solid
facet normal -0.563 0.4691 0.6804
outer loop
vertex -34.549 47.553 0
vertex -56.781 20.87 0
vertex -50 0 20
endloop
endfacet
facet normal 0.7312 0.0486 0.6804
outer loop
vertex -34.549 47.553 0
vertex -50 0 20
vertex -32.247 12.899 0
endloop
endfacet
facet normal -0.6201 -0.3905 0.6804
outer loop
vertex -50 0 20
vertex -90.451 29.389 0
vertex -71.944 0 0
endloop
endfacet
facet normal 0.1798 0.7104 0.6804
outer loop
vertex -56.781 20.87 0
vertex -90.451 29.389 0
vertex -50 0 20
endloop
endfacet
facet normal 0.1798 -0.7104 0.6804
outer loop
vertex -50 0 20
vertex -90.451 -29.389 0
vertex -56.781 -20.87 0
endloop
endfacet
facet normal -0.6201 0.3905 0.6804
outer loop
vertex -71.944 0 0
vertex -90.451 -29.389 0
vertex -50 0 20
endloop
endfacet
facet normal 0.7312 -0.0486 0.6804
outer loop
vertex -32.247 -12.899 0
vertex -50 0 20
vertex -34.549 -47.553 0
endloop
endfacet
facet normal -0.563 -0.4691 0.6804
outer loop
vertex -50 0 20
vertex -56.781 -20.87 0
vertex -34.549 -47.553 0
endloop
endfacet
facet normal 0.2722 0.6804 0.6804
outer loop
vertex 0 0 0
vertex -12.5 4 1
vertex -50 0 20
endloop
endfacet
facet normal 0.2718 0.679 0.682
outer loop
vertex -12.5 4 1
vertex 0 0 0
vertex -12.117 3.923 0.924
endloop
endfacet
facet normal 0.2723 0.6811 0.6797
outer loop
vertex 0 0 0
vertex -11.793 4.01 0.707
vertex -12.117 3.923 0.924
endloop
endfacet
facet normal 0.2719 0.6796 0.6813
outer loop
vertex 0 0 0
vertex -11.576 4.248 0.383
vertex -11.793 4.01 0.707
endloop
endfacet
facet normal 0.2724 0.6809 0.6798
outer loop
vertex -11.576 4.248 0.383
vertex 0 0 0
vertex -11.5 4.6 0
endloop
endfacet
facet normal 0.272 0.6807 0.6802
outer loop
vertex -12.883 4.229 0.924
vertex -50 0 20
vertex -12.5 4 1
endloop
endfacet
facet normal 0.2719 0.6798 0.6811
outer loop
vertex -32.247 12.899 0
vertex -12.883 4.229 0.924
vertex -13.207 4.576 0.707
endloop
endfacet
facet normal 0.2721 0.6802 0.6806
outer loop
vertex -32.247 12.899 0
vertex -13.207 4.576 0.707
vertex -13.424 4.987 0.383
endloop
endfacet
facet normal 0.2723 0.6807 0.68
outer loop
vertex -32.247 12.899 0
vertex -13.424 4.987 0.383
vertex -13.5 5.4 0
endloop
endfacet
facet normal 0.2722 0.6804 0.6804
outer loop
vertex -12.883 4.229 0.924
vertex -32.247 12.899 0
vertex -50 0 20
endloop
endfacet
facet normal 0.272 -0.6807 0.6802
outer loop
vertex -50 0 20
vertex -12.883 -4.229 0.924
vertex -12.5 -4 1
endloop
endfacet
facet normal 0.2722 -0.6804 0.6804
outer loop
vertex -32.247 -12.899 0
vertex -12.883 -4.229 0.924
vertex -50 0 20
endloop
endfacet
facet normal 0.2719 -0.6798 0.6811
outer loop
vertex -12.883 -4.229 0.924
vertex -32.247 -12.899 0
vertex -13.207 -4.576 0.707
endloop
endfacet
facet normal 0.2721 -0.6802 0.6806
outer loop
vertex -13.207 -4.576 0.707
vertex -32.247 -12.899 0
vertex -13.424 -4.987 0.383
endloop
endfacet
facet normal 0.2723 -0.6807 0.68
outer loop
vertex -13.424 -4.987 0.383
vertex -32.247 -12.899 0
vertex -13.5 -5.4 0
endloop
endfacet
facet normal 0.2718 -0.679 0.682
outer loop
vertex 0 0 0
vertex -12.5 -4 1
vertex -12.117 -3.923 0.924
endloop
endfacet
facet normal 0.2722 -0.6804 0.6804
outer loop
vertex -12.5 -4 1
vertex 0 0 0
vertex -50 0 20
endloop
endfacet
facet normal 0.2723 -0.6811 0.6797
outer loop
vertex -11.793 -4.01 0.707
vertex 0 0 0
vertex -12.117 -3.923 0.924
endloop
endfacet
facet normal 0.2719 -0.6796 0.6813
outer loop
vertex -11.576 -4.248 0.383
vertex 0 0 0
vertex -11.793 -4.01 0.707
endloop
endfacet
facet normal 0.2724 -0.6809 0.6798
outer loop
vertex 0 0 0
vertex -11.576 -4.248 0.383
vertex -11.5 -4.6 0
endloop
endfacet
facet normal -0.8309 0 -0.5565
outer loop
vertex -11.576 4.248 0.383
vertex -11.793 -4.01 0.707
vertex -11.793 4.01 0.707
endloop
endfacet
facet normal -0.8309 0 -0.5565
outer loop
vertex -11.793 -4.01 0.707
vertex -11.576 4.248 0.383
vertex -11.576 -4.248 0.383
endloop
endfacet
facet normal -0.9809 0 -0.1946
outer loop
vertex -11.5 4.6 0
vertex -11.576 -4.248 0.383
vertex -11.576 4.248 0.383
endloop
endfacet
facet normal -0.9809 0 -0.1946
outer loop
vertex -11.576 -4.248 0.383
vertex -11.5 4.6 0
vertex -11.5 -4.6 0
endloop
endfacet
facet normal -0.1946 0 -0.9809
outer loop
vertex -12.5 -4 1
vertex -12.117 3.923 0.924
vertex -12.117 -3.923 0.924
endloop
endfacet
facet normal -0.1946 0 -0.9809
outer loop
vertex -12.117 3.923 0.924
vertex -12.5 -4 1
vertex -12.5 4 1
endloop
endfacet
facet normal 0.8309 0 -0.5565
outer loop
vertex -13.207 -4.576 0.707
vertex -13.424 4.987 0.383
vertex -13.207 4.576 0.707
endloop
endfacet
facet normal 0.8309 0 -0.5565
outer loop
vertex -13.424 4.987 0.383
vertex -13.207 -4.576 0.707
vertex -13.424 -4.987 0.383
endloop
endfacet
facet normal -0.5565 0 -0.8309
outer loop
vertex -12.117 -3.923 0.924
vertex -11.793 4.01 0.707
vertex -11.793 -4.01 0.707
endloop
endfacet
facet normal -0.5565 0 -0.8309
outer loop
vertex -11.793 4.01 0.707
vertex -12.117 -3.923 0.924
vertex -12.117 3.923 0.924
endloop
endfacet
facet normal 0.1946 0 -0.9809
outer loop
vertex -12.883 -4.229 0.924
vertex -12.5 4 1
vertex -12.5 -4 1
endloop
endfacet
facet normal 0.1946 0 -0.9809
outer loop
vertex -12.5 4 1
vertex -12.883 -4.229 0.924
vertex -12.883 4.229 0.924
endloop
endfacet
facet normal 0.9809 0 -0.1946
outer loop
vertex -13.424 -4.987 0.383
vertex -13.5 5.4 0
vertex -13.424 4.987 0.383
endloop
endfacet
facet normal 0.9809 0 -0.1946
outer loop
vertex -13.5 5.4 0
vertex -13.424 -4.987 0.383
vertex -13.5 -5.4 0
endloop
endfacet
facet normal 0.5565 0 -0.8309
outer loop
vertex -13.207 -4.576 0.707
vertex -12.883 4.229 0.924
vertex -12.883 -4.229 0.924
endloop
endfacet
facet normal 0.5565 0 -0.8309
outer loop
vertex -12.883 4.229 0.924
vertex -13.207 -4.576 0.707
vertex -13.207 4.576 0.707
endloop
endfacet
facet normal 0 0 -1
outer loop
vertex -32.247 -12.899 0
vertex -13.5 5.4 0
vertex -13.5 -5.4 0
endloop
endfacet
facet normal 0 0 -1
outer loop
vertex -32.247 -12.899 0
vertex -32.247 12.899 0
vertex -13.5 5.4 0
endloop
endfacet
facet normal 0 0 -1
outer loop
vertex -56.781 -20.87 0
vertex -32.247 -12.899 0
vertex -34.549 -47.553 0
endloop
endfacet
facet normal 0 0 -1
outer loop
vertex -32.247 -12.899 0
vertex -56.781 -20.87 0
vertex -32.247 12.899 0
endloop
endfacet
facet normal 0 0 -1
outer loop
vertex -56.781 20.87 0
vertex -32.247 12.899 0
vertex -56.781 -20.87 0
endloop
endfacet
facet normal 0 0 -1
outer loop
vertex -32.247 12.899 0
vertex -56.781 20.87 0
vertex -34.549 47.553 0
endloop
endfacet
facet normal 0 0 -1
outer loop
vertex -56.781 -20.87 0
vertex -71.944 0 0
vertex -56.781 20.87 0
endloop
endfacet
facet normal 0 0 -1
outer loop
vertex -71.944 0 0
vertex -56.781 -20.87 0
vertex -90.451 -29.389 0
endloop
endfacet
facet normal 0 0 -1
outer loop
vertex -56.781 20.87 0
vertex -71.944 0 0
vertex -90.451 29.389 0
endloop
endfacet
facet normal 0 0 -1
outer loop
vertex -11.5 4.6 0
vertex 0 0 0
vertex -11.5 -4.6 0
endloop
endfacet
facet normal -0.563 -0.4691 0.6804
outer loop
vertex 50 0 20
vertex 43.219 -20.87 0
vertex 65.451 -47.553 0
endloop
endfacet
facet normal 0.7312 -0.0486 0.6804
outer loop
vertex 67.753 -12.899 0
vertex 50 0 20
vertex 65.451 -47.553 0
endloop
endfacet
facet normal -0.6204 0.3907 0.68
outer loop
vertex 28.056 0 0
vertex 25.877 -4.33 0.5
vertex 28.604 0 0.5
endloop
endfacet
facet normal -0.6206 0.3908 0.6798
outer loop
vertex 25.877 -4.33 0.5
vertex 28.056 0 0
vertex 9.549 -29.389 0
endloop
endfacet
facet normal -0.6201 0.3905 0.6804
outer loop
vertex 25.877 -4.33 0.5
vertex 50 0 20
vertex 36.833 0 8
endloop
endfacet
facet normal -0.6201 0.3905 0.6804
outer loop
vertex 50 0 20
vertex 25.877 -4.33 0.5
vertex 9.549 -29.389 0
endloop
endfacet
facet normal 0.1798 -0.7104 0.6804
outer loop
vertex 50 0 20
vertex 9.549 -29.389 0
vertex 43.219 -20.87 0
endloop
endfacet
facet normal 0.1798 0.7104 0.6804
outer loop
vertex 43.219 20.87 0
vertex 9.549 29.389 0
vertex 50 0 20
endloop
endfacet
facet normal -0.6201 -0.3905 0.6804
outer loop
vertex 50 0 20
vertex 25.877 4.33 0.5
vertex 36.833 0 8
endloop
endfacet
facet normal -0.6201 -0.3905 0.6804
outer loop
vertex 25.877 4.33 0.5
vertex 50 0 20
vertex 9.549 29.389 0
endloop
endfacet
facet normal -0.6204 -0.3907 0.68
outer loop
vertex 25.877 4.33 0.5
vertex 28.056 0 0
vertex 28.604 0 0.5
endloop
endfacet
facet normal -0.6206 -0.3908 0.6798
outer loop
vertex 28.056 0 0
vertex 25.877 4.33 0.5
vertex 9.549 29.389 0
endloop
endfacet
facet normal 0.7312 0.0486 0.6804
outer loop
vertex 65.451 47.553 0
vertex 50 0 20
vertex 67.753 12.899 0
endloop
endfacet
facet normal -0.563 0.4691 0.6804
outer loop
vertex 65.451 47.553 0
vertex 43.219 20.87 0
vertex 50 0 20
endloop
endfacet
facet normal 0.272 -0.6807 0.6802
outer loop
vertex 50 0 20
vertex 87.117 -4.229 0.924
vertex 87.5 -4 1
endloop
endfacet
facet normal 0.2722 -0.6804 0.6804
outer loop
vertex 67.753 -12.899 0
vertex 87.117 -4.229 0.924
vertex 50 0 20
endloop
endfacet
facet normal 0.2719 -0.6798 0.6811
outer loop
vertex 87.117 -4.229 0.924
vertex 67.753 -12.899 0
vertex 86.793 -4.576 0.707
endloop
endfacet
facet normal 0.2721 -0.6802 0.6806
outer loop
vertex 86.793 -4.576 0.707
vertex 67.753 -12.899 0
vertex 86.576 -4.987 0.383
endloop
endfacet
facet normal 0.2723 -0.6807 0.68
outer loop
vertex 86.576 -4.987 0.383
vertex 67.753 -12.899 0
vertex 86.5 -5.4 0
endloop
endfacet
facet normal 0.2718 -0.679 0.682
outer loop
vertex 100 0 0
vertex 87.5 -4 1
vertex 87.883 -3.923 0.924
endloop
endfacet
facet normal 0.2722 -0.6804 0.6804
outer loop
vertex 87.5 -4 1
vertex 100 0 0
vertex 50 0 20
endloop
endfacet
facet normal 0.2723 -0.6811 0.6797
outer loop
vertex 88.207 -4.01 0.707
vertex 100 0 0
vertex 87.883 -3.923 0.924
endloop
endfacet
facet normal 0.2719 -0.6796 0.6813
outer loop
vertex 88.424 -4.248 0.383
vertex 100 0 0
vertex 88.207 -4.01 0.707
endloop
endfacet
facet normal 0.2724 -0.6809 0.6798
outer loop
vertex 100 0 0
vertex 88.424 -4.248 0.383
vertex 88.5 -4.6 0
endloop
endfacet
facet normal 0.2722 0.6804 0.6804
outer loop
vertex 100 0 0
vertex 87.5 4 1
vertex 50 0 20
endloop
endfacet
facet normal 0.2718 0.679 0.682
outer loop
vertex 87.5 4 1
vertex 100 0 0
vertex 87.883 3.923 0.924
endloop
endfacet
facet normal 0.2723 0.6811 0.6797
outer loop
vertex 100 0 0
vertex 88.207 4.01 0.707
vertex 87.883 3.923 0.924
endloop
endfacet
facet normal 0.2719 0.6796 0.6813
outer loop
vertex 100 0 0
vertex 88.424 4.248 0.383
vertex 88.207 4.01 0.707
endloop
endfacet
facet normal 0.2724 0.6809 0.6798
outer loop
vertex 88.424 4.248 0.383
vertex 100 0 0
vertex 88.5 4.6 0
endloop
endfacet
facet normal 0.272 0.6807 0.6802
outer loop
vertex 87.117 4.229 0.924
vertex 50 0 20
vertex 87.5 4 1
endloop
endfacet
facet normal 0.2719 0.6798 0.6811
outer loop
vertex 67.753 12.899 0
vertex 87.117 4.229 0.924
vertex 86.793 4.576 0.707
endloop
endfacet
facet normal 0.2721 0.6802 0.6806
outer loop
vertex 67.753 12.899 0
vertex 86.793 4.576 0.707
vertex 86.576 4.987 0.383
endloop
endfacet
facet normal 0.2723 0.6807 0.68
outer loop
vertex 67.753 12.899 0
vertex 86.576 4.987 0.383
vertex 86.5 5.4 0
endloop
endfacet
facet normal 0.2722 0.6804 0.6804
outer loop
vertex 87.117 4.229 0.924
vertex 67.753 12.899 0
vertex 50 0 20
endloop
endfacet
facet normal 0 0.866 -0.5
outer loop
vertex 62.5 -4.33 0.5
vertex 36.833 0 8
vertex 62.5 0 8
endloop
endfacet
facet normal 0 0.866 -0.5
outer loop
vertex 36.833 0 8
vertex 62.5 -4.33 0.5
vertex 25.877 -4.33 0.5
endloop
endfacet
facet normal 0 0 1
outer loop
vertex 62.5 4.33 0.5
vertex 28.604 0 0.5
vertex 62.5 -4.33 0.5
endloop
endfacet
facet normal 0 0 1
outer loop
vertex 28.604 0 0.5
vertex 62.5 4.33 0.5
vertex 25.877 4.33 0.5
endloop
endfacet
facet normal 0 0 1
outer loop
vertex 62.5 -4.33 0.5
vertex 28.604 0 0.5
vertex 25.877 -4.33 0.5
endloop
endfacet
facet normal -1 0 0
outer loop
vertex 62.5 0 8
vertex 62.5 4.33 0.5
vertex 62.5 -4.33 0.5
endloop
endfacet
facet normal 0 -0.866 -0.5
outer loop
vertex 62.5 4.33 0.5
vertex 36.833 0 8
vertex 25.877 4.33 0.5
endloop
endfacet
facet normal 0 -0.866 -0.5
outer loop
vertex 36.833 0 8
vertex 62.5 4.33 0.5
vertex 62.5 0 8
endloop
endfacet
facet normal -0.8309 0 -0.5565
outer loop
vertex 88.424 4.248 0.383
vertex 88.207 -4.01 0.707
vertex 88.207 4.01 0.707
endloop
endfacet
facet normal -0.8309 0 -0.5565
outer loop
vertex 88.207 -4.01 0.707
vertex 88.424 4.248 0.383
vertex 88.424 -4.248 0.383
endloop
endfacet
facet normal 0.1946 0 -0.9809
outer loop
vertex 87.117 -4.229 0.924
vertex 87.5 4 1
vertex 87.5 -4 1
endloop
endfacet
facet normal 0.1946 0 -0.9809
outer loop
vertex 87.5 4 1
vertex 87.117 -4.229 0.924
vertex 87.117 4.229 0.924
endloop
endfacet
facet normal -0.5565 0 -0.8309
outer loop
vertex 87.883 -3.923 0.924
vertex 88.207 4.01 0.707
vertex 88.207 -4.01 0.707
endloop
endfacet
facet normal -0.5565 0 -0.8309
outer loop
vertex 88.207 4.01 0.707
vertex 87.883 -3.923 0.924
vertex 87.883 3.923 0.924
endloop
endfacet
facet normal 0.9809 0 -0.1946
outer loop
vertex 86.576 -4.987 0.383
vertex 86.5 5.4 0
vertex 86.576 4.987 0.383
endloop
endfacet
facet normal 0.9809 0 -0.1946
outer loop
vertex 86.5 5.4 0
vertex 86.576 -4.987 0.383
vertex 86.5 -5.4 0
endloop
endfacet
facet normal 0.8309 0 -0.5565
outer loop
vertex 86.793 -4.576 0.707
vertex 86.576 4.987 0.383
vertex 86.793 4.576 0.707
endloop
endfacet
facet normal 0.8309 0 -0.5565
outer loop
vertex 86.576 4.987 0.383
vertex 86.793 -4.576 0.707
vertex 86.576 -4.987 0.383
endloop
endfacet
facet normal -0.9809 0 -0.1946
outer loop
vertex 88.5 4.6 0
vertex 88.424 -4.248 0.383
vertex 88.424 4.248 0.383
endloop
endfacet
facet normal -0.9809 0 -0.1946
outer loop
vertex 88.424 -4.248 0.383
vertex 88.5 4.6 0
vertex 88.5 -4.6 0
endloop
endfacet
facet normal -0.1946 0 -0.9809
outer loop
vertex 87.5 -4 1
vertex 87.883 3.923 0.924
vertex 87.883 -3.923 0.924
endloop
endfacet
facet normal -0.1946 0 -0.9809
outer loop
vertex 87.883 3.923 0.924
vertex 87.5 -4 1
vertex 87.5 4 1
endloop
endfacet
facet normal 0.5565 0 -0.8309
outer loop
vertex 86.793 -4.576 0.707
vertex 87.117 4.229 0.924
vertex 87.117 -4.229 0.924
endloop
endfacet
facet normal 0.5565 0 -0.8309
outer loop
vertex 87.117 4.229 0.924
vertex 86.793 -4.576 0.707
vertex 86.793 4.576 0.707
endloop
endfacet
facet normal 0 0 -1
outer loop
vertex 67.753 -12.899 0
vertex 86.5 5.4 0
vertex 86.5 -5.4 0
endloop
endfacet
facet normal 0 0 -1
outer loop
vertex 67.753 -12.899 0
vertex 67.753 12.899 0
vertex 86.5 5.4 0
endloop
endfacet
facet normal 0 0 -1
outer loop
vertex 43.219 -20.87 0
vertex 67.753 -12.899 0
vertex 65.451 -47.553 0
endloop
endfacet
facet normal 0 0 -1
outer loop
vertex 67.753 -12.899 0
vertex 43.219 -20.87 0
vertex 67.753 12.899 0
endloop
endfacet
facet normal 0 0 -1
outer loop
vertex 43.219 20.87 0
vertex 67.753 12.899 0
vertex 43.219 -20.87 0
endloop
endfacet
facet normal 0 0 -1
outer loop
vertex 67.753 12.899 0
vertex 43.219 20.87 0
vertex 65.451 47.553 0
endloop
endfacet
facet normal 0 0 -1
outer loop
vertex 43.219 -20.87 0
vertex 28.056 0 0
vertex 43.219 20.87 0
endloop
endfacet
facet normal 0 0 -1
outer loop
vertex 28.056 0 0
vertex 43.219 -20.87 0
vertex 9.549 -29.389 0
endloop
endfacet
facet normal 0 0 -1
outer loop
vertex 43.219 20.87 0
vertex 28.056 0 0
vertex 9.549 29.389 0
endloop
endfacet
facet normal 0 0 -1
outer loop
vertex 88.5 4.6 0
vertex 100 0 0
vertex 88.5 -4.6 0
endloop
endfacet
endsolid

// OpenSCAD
//StarMaker Halves
//by Alex Tanchoco (LionAlex)
//December 10, 2013
//Originally designed for making Christmas tree ornaments but can be adopted for making all kinds of stars


star_points = 5;
star_thickness = 0;
point_length = 50;
point_width = 20;
point_thickness = 5;
point_points = 4;
post_diameter = 10;
post_sides = 3;
each_angle = 180/point_points;
mounting_post = true;
thread_hole = true;

translate( [-point_length,0,0] )
	top_half();
translate( [point_length,0,0] )
	bottom_half();


module top_half() {
	//top half
	difference() {
		fullstar();
		translate( [-point_length,-point_length,-point_length*2] )
			cube( [point_length*2,point_length*2,point_length*2,] );
	}

}


module bottom_half() {
	//bottom half
	difference() {
		rotate( [180,0,0] )
			fullstar();	
		translate( [-point_length,-point_length,-point_length*2] )
			cube( [point_length*2,point_length*2,point_length*2,] );
	}
}


module fullstar() {
difference() {
	intersection() {
		star();
		if( star_thickness>0 )
		cube( [point_length*3,point_length*3,star_thickness], center=true );
	}
	//mounting post
	if( mounting_post )
		translate( [-point_length*0.25,0,-post_diameter/2+2] )
			rotate( [0,90,0] )
				cylinder( h=point_length,r=post_diameter/2,$fn=post_sides, center = true );

	//thread hole
	if( thread_hole )
		translate( [point_length*0.75,0,0] )
			rotate( [90,0,0] )
				cylinder( h=point_length,r=1,$fn=16, center = true );	
}
}

module star(star_scale=1) {
	scale( [star_scale,star_scale,star_scale] )
	for( i=[1:1:star_points] ) {
		rotate( [0,0,360/star_points * i] )
			translate( [point_length/2,0,0] )
				rotate( [0,90,0] )
				cylinder( h=point_length, r1=point_width, r2=0, $fn = point_points, center=true );
	}
}
